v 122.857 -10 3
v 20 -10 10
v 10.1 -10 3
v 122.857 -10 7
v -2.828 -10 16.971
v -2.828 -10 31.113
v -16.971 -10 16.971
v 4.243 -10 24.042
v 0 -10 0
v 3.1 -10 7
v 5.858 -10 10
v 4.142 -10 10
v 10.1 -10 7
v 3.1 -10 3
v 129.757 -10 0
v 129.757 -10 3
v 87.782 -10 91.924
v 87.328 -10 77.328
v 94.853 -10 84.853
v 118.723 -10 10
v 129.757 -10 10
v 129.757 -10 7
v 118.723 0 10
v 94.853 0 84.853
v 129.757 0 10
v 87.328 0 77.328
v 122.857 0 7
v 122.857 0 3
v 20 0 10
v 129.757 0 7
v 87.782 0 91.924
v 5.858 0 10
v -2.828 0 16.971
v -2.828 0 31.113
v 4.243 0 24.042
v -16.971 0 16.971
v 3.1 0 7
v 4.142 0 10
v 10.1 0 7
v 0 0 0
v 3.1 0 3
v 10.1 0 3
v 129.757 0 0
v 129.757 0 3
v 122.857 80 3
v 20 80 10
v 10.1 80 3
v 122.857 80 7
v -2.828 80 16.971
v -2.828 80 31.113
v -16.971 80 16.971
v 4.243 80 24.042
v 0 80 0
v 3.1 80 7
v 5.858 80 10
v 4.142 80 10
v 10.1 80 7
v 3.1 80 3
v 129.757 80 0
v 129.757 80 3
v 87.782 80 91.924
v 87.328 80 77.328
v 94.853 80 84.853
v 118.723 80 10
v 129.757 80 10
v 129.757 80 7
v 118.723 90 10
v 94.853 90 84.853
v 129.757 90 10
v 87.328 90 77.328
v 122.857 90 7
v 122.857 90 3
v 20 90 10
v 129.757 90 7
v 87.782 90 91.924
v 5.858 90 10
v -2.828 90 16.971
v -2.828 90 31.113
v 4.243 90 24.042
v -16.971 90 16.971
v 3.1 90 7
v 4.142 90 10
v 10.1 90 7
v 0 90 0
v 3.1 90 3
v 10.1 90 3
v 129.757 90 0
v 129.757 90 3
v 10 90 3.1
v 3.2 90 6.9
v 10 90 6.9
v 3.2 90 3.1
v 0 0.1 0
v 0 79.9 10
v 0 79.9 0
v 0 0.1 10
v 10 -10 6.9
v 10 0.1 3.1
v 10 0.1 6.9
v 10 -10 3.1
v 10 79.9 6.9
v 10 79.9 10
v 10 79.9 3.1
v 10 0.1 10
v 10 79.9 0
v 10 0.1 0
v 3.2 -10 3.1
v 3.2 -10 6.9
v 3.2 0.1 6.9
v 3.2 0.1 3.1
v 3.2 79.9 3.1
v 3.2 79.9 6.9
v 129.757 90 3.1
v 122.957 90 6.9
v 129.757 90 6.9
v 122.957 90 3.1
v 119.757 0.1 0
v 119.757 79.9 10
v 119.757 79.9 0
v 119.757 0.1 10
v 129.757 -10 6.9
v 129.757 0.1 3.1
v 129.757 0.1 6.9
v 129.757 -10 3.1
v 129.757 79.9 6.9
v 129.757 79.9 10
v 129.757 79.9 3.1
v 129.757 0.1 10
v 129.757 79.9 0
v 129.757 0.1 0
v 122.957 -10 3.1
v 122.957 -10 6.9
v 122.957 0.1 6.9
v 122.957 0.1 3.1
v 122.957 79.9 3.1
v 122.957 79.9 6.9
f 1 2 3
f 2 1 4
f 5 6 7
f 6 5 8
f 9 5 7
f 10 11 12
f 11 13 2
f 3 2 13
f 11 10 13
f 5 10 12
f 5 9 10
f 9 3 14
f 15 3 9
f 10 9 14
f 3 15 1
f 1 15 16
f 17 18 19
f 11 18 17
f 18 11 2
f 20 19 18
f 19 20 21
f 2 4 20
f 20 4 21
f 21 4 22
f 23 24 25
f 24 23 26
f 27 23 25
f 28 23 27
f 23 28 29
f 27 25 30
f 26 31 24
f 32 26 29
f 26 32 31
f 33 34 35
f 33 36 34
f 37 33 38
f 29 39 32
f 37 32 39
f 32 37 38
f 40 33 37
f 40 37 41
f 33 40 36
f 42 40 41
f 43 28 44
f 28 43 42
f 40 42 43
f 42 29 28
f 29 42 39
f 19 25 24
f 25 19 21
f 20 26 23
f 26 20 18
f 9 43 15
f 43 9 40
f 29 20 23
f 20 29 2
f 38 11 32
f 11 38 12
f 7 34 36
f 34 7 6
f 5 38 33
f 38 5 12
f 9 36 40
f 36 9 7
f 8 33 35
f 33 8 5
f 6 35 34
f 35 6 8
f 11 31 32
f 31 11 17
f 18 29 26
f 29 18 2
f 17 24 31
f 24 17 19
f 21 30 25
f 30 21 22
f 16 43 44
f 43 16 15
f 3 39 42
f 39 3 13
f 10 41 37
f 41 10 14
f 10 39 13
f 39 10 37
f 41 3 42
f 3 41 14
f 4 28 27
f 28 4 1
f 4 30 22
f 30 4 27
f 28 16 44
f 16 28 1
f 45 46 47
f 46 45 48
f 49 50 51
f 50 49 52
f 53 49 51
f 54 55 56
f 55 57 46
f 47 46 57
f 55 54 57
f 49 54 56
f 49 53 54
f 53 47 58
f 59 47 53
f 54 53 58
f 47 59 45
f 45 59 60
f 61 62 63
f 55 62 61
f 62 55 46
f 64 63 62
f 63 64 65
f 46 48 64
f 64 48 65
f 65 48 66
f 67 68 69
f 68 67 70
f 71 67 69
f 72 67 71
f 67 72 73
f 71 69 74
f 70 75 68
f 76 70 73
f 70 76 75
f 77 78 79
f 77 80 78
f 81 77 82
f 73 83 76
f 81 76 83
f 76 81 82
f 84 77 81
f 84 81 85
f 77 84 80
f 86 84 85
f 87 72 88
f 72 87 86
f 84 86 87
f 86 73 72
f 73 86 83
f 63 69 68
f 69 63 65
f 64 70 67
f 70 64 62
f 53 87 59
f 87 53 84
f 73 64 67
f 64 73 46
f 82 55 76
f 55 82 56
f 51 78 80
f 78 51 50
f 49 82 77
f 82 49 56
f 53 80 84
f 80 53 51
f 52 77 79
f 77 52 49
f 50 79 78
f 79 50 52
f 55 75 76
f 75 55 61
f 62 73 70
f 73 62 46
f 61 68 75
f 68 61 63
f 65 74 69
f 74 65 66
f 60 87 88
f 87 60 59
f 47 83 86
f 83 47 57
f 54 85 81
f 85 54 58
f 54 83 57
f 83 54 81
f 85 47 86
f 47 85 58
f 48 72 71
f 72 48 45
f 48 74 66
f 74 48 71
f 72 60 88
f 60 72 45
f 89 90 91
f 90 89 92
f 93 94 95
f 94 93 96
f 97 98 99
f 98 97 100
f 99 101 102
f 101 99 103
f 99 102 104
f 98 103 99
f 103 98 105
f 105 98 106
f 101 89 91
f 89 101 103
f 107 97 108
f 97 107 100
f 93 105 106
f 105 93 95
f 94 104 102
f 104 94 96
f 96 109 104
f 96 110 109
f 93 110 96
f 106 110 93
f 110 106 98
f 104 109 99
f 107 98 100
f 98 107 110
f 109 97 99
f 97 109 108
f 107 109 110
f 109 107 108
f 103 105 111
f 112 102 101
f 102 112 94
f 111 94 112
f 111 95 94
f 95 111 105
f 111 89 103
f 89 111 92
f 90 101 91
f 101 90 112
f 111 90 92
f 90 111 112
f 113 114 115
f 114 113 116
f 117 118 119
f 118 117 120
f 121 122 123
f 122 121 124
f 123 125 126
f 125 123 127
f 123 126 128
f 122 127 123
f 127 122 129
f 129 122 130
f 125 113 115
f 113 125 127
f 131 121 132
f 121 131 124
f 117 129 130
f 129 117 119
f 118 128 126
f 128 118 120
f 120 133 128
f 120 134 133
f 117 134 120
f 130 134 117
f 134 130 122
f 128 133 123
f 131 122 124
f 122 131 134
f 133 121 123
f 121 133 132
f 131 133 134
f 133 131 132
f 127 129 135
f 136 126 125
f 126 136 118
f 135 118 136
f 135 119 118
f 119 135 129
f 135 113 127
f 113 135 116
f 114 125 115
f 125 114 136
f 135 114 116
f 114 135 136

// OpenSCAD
// preview[view:south west, tilt:top diagonal]

// Angle of iPad on stand;
Angle = 45; // [10:80]
// Angle of back support;
BackAngle = 25; // [10:80]
// Length of support
SupportLength = 120; // [50:240]
// Length of connecting bars
BarLength = 80; // [20:200]
Tolerance = 0.1; // [0, 0.1, 0.2, 0.3, 0.4, 0.5]


part = "Assembled"; // [Assembled: Assembled, Side: Side, Bar: Bar]


SubAngle = -(90-Angle);

SharedAngle = -SubAngle + BackAngle;
comp = (10/sin(SharedAngle));

truecomp = (SharedAngle > 90 ? comp : (SharedAngle == 90 ? 1 : 0));

echo(truecomp);


SubBackAngle = (90-BackAngle);

if(part=="Assembled")
{
	rotate([90, 0, 0]) Leg(Angle, BackAngle, SupportLength, Tolerance);
	
	translate([0, BarLength+10, 0])rotate([90, 0, 0]) Leg(Angle, BackAngle, SupportLength, Tolerance);
	rotate([-90, 0, 90]) translate([-10, -10, -10]) Bar(BarLength, Tolerance);
	rotate([-90, 0, 90]) translate([-10, -10, -10 - (cos(Angle)*SupportLength + sin(BackAngle)*(sin(Angle)*SupportLength)/cos(BackAngle)-10 + 10 - 10*tan(BackAngle))]) Bar(BarLength, Tolerance);
}
if(part=="Side")
{
	Leg(Angle, BackAngle, SupportLength, Tolerance);
}
if(part=="Bar")
{
	Bar(BarLength, Tolerance);
}

module Bar(BarLength, Tolerance)
{
	difference()
	{
		cube([BarLength+20, 10, 10]);
		translate([-0.5, 7 - Tolerance, -0.5]) cube([10.5+ Tolerance, 4 + Tolerance, 11]);
		translate([-0.5, -1 + Tolerance, -0.5]) cube([10.5+ Tolerance, 4, 11]);
		translate([-0.5, -0.5, 7 - Tolerance * 2]) cube([10.5+ Tolerance, 11, 4 + Tolerance * 2]);
		translate([BarLength+10 - Tolerance, 7 - Tolerance, -0.5]) cube([10.5 + Tolerance, 4 + Tolerance, 11]);
		translate([BarLength+10 - Tolerance, -1 + Tolerance, -0.5]) cube([10.5+ Tolerance, 4, 11]);
		translate([BarLength+10 - Tolerance, -0.5, 7 - Tolerance * 2]) cube([10.5+ Tolerance, 11, 4 + Tolerance * 2]);
	}
}

module Leg(Angle, BackAngle, SupportLength, Tolerance)
{
difference()
{
	union()
	{
		cube([10, 10, 10]);
		rotate([0, 0, SubAngle]) translate([-24, 0, 0]) cube([24, 10, 10]);
		rotate([0, 0, Angle]) translate([0, 14, 0]) cube([20, 10, 10]);
//		rotate([0, 0, SubAngle]) translate([-14, 10, 0]) %cube([10, 10, 10]);
		translate([10, 0, 0]) rotate([0, 0, Angle]) translate([0, 0, 0]) cube([SupportLength, 10, 10]);
		
		difference()
		{
			cube([cos(Angle)*SupportLength + sin(BackAngle)*(sin(Angle)*SupportLength)/cos(BackAngle) + 10 - 10*tan(BackAngle), 10, 10]);
//			translate([10, 0, 0]) rotate([0, 0, Angle]) translate([SupportLength, 0, 0]) rotate([0, 0, -Angle + BackAngle+90]) translate([(-sin(Angle)*SupportLength)/cos(BackAngle), -10, -0.5]) cube([(sin(Angle)*SupportLength)/cos(BackAngle), 10, 11]);
		}
		
		difference()
		{
			translate([10, 0, 0]) rotate([0, 0, Angle]) translate([SupportLength, 0, 0]) rotate([0, 0, -Angle + BackAngle+90]) translate([(-sin(Angle)*SupportLength)/cos(BackAngle), 0, 0]) cube([(sin(Angle)*SupportLength)/cos(BackAngle) + truecomp, 10, 10]);
			translate([0, -10, -0.5]) cube([cos(Angle)*SupportLength + sin(BackAngle)*(sin(Angle)*SupportLength)/cos(BackAngle) + 10*tan(SubBackAngle), 10, 11]);
		}
	}
	translate([3 + Tolerance, 3, -0.5]) cube([7, 4, 11]);
	translate([cos(Angle)*SupportLength + sin(BackAngle)*(sin(Angle)*SupportLength)/cos(BackAngle)- 7 + Tolerance + 10 - 10*tan(BackAngle), 3, -0.5]) cube([8, 4, 11]);
	translate([cos(Angle)*SupportLength + sin(BackAngle)*(sin(Angle)*SupportLength)/cos(BackAngle) + 10 - 10*tan(BackAngle), -10, -0.5]) cube([20, 20, 11]);
}
}
